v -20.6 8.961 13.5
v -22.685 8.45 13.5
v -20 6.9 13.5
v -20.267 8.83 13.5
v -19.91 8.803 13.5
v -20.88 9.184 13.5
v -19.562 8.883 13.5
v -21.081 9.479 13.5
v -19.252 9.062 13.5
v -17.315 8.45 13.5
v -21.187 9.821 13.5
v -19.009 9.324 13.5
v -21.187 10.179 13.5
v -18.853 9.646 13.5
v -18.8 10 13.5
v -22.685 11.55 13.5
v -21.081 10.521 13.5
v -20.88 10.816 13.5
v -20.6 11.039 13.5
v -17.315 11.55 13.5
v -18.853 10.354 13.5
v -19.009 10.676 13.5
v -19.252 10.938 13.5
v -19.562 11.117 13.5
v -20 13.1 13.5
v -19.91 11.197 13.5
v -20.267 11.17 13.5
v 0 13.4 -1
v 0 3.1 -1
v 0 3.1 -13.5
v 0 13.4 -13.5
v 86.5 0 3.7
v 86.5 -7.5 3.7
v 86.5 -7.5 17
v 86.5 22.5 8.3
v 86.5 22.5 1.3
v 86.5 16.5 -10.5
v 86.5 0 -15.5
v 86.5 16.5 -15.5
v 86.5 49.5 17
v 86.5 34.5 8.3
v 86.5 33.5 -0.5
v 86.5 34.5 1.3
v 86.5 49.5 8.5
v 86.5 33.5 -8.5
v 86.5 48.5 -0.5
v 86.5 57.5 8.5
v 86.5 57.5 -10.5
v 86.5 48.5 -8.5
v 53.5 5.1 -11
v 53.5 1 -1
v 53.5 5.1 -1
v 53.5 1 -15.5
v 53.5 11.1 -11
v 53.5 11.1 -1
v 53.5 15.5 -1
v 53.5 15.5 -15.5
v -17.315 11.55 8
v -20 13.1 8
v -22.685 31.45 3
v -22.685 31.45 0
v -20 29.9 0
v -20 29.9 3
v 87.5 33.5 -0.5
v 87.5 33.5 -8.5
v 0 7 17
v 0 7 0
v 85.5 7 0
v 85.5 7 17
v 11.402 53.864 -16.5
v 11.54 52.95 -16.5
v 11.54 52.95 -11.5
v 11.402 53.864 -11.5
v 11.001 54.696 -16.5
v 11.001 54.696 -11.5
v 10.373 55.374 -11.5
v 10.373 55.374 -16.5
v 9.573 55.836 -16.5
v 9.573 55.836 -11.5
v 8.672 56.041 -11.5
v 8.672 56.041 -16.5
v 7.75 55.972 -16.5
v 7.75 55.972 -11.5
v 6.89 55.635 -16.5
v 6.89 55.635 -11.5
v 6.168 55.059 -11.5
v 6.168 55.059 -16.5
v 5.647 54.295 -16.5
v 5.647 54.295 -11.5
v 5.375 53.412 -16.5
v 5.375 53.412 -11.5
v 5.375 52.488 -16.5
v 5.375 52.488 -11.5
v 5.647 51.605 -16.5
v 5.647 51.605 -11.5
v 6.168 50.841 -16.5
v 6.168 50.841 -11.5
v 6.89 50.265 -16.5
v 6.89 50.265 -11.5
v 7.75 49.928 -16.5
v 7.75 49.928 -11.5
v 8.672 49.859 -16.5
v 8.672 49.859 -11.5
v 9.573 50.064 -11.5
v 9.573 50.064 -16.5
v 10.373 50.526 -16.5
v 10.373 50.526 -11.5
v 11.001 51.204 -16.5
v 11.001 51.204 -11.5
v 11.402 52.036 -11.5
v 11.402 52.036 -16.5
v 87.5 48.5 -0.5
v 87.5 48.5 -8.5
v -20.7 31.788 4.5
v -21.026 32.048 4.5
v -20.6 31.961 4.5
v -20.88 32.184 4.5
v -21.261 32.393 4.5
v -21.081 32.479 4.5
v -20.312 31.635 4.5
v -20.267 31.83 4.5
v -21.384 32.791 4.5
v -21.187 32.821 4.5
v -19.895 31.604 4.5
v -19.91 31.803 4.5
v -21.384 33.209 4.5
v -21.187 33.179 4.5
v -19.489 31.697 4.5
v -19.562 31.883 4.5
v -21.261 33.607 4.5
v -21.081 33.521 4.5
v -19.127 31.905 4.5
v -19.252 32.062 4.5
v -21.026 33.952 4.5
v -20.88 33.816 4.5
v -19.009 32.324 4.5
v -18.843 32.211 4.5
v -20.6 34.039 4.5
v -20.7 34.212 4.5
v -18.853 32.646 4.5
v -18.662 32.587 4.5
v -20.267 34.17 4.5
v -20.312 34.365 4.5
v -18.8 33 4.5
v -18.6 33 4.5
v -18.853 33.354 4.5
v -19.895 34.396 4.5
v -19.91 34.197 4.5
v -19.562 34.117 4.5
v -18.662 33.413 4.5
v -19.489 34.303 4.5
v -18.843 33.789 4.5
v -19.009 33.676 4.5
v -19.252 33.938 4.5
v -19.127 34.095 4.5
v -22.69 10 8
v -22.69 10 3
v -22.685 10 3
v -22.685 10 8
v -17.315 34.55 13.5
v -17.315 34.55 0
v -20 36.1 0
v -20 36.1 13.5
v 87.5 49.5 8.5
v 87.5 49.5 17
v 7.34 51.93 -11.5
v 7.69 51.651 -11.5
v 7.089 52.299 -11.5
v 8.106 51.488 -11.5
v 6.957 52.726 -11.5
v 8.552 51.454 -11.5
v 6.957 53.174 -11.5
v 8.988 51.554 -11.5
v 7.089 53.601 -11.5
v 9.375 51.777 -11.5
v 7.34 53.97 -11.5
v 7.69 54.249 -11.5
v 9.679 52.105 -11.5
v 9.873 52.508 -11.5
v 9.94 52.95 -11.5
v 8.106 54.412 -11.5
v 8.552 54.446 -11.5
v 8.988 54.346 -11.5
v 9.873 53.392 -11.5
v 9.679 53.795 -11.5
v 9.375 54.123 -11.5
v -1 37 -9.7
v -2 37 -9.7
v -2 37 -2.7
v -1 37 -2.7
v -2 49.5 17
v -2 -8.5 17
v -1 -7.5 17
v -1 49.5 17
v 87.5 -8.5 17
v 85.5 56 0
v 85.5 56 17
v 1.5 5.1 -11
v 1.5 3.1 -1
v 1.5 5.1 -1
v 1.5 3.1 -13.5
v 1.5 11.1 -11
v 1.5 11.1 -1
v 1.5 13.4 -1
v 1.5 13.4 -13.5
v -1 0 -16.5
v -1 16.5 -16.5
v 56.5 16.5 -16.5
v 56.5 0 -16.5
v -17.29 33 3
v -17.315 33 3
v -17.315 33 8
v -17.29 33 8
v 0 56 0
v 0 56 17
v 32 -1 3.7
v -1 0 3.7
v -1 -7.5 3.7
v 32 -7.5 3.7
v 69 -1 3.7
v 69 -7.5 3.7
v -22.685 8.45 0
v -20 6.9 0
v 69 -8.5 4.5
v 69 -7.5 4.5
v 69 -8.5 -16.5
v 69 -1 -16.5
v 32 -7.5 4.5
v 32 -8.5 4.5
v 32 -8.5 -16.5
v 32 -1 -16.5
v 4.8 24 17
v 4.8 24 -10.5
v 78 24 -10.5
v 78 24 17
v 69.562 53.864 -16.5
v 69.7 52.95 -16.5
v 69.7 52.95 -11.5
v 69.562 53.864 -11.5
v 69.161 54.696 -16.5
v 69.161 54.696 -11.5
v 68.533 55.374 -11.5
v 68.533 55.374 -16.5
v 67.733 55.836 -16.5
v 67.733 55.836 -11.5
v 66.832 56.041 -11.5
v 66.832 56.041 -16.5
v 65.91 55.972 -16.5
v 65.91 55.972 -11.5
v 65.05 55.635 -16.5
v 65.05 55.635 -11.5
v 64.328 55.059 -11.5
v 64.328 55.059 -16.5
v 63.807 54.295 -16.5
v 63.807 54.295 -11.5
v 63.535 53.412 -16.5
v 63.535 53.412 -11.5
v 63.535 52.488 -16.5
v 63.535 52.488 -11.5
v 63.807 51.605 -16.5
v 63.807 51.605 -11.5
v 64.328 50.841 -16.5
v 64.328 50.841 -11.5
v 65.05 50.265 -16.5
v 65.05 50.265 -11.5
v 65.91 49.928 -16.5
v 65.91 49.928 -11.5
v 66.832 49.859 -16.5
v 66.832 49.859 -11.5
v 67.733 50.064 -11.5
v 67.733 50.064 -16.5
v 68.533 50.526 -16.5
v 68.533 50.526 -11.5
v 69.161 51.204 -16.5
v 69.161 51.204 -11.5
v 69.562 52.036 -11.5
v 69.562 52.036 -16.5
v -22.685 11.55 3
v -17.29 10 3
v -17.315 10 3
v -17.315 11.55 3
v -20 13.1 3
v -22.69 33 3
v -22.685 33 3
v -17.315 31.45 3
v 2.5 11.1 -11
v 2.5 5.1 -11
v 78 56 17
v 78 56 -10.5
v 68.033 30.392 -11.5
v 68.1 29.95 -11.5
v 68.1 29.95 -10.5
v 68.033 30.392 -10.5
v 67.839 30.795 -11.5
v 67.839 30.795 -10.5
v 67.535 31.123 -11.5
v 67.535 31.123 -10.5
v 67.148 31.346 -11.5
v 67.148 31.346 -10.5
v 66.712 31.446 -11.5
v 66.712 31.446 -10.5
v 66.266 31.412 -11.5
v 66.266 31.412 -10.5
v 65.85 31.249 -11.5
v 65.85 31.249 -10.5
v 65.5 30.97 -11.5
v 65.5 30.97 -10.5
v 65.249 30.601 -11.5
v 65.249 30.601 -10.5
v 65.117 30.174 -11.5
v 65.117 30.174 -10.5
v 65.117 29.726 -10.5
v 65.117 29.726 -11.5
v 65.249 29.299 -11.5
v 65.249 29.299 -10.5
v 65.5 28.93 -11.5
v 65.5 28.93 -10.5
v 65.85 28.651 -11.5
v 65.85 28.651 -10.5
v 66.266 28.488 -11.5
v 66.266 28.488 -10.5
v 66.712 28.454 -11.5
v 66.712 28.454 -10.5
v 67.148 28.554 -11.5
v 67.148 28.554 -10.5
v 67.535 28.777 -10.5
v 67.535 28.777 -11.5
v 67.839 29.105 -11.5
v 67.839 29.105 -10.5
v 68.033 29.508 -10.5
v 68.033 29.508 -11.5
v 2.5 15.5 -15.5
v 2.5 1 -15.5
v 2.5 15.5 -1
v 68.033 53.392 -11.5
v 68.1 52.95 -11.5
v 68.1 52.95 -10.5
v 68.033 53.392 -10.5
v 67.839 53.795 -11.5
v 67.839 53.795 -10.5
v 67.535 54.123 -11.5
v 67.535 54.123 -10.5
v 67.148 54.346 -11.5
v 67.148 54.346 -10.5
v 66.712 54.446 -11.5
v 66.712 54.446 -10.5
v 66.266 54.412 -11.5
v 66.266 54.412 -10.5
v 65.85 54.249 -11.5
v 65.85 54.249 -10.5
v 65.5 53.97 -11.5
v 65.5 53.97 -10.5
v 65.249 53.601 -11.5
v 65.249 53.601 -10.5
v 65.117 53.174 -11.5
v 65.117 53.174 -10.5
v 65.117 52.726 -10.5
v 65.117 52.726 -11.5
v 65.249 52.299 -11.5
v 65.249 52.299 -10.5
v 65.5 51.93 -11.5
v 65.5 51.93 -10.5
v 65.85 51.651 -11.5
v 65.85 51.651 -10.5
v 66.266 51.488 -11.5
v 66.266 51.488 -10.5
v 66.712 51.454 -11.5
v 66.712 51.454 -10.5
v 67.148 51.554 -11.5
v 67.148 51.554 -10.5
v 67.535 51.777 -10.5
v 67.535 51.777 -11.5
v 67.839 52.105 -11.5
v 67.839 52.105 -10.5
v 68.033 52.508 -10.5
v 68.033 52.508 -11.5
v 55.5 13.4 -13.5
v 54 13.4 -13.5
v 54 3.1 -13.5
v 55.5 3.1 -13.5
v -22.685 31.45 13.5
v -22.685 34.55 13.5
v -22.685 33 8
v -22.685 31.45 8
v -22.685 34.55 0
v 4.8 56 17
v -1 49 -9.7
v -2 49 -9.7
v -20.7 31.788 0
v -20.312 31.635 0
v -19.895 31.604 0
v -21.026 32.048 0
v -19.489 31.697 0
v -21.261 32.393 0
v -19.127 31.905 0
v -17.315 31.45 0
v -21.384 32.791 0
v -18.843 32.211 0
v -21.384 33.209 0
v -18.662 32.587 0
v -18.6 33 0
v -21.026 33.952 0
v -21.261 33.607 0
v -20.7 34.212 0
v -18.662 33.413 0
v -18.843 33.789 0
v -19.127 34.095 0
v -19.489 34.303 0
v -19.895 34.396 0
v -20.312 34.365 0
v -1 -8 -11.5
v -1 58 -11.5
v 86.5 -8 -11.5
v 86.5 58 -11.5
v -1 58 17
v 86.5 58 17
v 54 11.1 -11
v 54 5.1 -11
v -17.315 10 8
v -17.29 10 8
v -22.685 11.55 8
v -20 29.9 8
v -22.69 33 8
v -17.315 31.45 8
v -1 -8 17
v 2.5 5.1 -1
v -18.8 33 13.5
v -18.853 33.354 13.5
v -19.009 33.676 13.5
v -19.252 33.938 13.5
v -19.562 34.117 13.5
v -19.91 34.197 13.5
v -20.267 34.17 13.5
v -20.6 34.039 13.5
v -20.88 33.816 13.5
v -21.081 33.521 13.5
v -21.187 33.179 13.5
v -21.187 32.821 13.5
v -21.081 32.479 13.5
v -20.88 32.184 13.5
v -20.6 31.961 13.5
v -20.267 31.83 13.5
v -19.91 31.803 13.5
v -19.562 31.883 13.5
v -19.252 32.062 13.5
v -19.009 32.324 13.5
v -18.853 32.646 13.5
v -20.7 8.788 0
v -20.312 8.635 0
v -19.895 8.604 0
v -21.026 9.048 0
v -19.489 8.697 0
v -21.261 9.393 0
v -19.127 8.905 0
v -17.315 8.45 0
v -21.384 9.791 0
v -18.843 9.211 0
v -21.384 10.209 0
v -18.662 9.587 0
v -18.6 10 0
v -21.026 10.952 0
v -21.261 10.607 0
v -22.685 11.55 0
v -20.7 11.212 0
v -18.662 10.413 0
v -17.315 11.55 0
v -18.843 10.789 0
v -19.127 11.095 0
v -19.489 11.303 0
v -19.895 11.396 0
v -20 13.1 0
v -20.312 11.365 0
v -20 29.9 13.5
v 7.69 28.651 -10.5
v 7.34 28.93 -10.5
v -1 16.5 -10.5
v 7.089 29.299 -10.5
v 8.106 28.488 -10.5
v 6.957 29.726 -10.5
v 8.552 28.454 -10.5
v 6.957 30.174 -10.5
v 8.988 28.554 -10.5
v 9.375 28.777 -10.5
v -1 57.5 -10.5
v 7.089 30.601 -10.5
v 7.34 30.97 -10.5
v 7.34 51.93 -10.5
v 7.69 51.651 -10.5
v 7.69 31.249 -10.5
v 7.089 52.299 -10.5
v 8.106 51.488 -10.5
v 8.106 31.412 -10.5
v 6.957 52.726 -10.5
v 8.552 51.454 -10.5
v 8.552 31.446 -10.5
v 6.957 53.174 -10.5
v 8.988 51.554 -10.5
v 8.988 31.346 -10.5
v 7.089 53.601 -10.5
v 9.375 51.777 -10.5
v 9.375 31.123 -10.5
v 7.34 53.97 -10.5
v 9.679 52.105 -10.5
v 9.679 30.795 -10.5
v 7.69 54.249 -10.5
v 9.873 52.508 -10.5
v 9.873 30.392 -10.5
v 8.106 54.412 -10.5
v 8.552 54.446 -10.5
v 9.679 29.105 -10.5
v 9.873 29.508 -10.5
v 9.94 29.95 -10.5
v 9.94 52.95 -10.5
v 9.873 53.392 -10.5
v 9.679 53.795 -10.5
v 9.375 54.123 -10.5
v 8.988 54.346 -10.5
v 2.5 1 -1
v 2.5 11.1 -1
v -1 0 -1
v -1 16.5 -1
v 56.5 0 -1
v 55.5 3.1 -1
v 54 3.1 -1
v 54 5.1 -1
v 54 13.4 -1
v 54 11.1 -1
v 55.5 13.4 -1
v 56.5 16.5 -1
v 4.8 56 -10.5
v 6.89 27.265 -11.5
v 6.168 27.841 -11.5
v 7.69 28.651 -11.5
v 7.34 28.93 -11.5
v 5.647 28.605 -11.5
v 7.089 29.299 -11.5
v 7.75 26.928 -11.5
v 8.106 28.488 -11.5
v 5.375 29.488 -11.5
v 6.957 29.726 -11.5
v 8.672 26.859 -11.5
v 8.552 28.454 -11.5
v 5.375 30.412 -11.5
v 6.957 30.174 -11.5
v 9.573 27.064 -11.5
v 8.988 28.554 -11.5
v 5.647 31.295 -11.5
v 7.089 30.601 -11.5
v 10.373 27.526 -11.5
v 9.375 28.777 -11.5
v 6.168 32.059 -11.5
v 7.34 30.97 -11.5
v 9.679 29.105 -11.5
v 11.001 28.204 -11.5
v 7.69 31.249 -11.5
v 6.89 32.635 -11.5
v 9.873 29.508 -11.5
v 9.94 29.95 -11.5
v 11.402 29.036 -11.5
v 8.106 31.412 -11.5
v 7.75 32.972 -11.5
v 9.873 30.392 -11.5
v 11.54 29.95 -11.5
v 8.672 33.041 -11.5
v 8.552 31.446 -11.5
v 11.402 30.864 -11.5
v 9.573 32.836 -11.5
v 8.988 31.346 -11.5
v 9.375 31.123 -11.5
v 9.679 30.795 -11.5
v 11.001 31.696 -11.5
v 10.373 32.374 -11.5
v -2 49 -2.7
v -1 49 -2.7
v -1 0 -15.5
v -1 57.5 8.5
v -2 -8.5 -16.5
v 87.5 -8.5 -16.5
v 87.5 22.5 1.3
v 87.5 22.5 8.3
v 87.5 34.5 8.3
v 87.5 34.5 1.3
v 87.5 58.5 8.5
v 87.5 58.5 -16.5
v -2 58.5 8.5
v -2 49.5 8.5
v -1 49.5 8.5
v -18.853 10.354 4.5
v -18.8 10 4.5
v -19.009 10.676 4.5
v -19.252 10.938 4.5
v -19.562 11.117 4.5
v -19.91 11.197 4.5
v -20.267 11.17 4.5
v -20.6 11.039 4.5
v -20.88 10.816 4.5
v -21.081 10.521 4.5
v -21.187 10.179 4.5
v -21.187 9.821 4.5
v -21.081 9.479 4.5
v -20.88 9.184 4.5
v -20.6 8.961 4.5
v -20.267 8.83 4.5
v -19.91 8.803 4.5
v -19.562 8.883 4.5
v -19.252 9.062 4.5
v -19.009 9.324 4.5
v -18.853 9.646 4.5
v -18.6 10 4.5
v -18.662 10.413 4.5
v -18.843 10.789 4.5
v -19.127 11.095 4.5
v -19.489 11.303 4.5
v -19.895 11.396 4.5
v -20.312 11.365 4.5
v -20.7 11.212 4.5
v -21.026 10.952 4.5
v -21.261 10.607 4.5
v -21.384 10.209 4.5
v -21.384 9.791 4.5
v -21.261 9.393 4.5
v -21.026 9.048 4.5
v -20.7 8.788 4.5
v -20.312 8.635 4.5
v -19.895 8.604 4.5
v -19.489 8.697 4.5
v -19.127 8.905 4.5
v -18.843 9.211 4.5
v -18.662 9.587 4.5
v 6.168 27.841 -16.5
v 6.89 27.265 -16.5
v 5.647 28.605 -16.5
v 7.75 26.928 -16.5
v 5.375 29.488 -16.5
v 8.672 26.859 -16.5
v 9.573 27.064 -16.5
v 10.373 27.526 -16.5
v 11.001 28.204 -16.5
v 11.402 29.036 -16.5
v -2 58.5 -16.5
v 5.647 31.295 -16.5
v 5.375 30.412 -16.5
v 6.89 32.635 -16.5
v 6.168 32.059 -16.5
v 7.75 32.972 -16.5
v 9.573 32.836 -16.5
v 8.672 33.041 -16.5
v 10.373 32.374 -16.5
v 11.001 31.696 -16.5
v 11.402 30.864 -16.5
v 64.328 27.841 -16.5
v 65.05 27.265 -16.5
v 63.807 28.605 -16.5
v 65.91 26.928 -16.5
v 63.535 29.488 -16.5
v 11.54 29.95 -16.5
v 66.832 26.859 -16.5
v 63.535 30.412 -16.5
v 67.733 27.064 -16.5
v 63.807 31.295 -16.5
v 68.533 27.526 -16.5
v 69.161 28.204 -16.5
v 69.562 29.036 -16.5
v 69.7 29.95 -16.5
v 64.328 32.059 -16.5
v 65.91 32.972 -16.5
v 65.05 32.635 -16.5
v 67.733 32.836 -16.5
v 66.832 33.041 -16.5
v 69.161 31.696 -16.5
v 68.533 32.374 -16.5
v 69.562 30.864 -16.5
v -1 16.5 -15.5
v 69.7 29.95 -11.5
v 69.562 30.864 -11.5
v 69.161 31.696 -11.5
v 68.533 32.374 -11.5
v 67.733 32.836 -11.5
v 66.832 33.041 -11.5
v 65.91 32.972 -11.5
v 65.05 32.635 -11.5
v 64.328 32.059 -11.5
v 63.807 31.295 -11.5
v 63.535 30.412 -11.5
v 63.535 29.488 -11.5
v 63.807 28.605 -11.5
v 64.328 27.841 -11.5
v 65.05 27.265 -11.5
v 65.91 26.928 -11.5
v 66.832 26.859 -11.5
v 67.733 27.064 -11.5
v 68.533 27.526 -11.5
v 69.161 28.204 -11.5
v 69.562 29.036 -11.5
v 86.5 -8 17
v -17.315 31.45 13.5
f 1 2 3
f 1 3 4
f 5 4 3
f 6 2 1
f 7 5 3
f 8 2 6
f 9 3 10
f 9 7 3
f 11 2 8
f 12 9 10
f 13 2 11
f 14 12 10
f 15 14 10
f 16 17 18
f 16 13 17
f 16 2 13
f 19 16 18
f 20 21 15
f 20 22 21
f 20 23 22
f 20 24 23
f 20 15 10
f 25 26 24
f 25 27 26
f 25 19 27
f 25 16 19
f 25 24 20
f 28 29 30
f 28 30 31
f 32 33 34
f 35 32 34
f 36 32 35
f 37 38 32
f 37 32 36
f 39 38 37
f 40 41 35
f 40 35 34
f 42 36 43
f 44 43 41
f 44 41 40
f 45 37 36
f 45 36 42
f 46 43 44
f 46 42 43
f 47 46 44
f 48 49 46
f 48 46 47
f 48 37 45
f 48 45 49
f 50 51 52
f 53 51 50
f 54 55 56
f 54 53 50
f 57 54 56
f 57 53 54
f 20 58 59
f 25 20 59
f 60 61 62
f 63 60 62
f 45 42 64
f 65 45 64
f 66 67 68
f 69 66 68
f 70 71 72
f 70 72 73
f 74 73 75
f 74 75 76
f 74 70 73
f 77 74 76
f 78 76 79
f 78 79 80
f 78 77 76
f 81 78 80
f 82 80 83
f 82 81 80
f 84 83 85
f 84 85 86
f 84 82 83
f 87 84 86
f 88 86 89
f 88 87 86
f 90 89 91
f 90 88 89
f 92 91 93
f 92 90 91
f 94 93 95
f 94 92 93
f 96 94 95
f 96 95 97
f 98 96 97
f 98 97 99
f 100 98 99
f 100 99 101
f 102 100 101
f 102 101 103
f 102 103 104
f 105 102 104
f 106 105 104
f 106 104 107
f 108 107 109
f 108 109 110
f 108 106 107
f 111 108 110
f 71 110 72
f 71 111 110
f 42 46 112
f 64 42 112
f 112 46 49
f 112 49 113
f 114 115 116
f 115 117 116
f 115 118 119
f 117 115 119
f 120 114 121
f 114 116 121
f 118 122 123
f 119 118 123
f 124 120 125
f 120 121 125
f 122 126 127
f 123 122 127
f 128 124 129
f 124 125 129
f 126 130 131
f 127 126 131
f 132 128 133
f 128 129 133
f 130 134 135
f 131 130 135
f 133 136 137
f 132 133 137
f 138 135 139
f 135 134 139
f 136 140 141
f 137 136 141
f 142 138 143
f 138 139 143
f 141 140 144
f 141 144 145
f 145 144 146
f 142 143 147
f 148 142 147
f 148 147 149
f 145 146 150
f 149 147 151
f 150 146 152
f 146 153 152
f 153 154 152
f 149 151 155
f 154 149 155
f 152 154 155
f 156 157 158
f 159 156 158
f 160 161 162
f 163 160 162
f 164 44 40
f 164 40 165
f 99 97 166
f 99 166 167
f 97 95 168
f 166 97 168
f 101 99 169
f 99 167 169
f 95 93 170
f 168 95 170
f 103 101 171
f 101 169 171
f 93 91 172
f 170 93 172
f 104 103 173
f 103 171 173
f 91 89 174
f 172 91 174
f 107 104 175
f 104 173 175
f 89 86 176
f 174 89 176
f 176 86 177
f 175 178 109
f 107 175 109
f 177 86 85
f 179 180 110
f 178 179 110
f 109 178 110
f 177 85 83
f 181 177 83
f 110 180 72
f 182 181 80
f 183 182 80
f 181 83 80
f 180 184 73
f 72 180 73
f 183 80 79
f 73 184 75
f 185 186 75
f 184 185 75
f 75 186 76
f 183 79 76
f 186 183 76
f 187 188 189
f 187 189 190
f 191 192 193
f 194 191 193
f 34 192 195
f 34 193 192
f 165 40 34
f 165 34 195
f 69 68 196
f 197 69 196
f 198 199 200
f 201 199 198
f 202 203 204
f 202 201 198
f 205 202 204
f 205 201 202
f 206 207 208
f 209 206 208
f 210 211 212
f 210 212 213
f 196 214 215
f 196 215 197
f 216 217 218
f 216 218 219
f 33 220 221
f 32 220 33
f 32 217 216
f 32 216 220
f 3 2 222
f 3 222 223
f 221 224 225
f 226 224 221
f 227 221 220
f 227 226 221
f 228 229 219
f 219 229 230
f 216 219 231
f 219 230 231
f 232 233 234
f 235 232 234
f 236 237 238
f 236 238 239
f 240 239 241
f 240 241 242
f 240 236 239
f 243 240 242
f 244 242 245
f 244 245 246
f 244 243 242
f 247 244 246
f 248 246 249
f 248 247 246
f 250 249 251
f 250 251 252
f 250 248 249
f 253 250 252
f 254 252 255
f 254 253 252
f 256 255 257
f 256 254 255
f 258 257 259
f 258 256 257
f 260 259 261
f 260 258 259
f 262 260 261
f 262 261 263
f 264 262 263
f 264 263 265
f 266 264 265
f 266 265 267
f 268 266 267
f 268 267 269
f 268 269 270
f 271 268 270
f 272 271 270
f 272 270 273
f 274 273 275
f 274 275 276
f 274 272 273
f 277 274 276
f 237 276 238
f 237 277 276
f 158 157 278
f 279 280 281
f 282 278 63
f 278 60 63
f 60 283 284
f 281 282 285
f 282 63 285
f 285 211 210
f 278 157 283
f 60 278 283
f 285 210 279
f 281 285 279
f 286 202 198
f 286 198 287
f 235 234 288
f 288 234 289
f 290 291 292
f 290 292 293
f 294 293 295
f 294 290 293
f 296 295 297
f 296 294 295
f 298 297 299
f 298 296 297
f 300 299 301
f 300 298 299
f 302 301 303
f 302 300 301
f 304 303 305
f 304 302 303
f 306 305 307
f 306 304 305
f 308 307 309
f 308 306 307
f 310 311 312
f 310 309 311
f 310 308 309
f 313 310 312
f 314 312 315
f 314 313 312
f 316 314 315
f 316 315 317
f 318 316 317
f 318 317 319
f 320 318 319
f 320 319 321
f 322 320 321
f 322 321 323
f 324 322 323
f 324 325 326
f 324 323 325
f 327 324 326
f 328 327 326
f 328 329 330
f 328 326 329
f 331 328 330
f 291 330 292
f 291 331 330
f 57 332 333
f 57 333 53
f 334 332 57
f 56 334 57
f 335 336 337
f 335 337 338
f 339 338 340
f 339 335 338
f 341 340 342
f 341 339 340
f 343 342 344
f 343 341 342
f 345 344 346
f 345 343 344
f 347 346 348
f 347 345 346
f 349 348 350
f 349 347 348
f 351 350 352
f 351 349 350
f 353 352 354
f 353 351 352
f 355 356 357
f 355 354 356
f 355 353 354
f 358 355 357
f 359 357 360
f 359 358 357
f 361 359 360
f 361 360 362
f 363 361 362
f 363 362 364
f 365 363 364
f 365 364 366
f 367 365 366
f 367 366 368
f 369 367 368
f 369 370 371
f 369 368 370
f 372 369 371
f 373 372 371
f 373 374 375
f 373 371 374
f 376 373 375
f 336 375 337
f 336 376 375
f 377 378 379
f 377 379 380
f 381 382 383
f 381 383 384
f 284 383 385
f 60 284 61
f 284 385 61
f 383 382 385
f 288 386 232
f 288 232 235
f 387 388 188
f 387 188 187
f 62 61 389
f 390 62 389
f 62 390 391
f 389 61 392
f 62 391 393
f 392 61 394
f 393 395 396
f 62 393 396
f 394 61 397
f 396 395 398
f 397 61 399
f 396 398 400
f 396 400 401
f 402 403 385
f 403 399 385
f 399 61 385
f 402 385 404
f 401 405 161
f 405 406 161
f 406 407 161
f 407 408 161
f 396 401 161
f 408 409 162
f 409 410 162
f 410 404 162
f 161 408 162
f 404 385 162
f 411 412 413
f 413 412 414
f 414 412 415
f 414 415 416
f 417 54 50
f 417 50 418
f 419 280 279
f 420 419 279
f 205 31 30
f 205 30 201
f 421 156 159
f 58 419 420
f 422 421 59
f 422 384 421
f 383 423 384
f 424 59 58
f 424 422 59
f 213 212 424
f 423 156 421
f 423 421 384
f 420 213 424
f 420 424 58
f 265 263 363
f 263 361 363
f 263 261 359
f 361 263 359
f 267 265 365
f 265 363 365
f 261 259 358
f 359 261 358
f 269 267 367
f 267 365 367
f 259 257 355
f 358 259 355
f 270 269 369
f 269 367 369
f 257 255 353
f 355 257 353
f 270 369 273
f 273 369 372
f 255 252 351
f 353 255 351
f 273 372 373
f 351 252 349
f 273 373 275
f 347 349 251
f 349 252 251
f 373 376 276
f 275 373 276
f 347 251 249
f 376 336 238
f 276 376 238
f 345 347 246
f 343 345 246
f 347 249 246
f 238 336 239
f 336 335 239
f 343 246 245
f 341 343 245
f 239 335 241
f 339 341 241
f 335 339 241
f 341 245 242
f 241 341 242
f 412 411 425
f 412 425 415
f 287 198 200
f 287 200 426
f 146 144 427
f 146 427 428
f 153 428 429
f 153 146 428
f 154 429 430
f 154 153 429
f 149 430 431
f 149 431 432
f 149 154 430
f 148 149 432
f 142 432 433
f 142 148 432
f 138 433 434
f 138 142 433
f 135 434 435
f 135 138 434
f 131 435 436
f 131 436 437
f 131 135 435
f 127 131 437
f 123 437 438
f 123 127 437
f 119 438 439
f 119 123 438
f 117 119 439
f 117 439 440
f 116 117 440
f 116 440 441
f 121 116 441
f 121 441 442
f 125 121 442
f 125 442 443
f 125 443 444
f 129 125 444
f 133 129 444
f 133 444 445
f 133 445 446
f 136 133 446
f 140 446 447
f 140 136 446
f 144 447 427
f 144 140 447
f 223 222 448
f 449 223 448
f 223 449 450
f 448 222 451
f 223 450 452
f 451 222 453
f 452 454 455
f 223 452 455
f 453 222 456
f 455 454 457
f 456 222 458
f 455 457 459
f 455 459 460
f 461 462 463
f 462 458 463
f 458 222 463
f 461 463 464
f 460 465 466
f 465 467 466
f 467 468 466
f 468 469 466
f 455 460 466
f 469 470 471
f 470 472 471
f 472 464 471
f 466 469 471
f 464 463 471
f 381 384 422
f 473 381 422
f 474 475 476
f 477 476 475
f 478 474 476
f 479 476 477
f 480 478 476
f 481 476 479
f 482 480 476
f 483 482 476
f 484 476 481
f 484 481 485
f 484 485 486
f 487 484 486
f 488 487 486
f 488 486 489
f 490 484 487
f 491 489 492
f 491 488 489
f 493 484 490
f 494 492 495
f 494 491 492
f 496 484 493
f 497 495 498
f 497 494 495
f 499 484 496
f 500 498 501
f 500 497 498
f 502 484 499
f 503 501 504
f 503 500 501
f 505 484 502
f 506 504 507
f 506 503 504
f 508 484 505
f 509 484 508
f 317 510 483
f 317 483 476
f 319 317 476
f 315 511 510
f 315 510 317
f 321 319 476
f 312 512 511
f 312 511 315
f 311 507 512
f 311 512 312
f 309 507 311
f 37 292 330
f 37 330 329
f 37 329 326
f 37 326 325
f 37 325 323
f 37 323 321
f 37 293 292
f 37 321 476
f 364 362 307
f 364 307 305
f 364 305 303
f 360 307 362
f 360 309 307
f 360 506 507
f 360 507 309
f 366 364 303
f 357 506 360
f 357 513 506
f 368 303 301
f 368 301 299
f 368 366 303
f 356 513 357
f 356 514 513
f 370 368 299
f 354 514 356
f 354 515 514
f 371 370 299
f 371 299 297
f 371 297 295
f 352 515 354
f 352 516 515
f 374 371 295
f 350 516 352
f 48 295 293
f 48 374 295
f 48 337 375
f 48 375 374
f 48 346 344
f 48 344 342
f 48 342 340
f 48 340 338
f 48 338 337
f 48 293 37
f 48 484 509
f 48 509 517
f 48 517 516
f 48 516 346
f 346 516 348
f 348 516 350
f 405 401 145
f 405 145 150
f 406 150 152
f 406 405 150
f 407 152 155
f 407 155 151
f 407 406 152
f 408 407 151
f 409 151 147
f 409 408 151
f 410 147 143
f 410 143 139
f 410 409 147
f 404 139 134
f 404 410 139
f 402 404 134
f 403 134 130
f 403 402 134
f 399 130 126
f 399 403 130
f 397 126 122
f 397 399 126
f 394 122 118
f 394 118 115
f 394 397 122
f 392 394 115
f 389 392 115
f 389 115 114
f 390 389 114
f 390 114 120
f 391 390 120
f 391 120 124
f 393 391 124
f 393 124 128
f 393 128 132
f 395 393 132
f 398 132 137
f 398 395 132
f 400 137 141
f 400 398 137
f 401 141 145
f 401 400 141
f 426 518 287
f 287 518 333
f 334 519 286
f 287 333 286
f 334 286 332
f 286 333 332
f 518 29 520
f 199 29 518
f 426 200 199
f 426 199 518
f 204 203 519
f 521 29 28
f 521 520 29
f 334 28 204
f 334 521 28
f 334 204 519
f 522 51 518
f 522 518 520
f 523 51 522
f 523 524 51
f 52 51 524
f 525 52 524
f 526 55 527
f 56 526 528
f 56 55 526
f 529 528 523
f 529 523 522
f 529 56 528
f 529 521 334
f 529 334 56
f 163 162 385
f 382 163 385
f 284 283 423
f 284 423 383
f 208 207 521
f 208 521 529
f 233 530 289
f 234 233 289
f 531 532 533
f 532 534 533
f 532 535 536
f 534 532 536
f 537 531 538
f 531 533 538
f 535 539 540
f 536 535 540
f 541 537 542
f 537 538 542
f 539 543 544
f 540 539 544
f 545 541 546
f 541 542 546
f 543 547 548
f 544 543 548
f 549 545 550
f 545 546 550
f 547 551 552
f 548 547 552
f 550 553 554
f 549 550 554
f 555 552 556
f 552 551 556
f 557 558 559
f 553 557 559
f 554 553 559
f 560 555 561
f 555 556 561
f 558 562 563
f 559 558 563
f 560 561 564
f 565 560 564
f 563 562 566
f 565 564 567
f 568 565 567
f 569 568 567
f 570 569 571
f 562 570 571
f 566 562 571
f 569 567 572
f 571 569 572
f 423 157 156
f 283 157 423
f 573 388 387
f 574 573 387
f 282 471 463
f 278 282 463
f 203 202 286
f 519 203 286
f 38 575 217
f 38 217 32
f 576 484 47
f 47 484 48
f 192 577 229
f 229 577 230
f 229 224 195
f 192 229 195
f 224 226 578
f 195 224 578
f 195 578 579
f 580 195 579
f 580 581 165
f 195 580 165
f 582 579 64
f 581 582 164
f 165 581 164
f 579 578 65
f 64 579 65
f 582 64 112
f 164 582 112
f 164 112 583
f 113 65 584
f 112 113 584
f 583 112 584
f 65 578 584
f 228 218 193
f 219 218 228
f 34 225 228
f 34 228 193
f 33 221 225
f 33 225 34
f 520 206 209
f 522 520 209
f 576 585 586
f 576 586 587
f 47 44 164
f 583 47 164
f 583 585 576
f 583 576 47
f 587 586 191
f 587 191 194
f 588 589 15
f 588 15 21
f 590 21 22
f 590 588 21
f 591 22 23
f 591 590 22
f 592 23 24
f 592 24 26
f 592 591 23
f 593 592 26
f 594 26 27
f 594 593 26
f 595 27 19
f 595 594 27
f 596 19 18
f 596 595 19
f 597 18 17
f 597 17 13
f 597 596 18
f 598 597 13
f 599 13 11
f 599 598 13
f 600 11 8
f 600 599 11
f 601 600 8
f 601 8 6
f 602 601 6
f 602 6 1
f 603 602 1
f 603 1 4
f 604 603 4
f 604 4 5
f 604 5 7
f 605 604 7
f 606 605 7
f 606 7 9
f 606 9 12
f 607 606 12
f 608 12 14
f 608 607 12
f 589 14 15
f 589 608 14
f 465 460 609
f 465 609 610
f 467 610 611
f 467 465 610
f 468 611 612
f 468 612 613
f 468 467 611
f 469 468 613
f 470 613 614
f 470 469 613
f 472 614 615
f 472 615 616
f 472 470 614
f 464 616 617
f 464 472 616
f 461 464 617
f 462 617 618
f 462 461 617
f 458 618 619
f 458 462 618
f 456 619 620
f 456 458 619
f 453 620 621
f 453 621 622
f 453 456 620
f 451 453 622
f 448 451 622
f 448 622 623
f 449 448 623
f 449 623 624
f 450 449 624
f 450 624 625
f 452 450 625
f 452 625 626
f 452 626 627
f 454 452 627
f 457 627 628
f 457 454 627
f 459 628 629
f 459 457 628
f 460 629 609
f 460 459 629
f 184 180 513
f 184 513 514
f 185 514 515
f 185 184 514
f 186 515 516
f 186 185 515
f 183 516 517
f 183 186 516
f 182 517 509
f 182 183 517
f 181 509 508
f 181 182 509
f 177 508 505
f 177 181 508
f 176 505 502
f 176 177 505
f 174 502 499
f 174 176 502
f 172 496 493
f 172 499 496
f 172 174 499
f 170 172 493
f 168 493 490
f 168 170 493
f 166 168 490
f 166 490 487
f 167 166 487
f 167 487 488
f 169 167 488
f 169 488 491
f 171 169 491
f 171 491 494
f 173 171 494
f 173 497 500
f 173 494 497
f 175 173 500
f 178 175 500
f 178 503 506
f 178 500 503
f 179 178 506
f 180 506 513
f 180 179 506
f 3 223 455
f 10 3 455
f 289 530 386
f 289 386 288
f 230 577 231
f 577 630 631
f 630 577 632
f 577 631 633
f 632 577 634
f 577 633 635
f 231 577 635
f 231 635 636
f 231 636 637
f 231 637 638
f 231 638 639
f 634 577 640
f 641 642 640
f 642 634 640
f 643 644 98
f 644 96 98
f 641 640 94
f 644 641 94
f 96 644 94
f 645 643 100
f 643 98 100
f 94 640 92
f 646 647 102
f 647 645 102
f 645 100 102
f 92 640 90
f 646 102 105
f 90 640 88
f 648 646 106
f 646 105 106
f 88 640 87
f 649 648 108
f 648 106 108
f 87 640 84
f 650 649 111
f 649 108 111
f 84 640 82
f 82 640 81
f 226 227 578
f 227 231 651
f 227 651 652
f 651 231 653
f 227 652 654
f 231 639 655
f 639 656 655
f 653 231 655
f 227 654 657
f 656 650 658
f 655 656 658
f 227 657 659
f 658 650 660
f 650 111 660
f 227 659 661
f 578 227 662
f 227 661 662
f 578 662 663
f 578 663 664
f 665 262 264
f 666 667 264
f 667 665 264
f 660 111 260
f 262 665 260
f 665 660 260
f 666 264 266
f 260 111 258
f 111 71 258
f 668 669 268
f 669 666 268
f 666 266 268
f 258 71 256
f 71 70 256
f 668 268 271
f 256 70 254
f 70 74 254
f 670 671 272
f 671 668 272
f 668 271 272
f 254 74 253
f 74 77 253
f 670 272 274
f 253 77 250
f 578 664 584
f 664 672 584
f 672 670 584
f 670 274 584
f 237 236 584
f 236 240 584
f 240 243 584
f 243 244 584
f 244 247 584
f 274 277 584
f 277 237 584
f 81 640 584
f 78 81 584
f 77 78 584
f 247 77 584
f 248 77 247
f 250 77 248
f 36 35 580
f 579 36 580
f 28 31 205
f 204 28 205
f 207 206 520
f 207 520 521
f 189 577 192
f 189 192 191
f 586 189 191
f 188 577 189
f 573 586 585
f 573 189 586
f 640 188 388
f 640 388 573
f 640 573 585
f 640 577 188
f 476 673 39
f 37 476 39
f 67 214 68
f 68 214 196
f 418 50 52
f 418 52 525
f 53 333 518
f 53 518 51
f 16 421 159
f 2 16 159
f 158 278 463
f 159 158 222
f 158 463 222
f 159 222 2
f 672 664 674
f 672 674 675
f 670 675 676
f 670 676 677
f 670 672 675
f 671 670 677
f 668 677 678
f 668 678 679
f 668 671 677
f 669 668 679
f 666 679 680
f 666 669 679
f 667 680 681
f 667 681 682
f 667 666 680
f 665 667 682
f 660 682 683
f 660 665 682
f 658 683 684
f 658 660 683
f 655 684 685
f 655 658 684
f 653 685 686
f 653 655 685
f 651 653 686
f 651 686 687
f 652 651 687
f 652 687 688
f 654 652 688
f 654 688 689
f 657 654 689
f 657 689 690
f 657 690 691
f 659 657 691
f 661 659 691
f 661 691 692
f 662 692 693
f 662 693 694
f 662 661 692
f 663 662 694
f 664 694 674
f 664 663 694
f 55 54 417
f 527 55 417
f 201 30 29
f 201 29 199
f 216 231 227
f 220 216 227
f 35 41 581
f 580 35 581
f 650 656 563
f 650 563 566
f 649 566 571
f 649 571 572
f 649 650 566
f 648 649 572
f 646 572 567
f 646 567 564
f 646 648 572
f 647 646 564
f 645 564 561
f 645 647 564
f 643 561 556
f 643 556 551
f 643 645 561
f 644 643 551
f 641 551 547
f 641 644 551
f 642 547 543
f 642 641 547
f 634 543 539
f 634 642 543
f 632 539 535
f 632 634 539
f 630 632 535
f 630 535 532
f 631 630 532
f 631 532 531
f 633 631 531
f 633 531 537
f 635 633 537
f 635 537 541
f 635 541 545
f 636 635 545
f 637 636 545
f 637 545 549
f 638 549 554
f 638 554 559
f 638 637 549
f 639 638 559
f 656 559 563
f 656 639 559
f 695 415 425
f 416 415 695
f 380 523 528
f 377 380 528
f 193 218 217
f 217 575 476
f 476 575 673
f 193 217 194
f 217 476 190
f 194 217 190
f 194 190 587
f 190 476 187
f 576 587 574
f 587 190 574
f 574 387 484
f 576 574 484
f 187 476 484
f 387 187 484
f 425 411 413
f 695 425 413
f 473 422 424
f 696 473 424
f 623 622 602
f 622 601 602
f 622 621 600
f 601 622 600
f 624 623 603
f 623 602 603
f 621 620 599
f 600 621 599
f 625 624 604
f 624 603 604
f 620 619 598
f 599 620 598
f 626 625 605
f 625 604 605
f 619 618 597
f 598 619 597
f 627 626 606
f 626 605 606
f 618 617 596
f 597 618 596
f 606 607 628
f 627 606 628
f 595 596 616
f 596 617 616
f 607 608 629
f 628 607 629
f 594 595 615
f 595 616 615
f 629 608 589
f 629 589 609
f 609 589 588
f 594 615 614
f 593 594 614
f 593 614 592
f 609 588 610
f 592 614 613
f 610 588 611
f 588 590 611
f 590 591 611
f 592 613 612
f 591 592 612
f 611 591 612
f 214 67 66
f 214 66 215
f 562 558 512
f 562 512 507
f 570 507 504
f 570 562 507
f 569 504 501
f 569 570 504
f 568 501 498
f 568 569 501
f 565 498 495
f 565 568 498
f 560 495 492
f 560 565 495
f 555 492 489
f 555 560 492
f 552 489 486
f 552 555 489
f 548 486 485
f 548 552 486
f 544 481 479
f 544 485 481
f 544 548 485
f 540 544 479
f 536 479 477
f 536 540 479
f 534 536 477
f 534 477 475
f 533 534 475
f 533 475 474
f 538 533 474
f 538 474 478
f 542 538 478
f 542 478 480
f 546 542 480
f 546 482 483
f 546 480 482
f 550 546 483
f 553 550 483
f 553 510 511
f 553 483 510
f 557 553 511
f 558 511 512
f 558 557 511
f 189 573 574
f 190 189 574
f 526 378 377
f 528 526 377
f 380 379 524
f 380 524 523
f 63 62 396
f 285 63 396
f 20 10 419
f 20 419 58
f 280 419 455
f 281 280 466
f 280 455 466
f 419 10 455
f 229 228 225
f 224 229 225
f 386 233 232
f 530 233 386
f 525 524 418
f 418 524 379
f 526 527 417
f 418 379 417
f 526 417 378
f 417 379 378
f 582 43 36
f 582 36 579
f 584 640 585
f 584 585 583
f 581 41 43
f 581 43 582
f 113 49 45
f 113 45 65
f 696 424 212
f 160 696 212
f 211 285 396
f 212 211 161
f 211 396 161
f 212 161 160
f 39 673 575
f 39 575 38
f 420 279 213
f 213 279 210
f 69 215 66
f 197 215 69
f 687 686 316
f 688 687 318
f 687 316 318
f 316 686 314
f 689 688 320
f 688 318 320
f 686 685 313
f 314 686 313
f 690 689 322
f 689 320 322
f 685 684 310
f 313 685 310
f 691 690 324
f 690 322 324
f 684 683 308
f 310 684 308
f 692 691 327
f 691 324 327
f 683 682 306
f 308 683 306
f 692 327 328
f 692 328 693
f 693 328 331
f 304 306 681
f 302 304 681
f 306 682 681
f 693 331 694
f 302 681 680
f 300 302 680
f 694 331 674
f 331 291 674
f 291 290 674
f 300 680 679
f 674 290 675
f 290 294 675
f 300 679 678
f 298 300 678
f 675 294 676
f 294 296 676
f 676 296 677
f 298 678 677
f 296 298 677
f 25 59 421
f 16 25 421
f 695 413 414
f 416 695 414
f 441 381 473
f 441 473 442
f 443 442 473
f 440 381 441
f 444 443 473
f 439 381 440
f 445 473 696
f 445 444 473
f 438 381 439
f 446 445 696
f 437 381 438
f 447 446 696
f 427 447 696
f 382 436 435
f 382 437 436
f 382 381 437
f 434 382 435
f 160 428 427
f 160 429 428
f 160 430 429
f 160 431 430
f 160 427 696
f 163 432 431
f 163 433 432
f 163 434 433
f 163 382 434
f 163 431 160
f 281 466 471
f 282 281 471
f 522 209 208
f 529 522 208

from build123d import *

# Parameters (mm, degrees)
BOX_W                    = 85.5
BOX_H                    = 49
BOX_DEPTH                = 17
BOX001_W                 = 73.2
BOX001_H                 = 32
BOX001_DEPTH             = 27.5
BOX003_W                 = 87.5
BOX003_H                 = 66
BOX003_DEPTH             = 28.5
BOX027_W                 = 5
BOX027_H                 = 6
BOX027_DEPTH             = 10
BOX026_W                 = 5
BOX026_H                 = 6
BOX026_DEPTH             = 10
BOX025_W                 = 1.5
BOX025_H                 = 10.3
BOX025_DEPTH             = 12.5
BOX024_W                 = 1.5
BOX024_H                 = 10.3
BOX024_DEPTH             = 12.5
BOX022_W                 = 51
BOX022_H                 = 14.5
BOX022_DEPTH             = 14.5
BOX023_W                 = 57.5
BOX023_H                 = 16.5
BOX023_DEPTH             = 15.5
BOX028_W                 = 10
BOX028_H                 = 12
BOX028_DEPTH             = 7
BOX029_W                 = 10
BOX029_H                 = 12
BOX029_DEPTH             = 7
BOX006_W                 = 10
BOX006_H                 = 15
BOX006_DEPTH             = 8
CYLINDER003_R            = 3.1
CYLINDER003_DEPTH        = 5
CYLINDER001_R            = 1.5
CYLINDER001_DEPTH        = 10
CYLINDER_R               = 1.5
CYLINDER_DEPTH           = 10
CYLINDER002_R            = 3.1
CYLINDER002_DEPTH        = 5
BOX002_W                 = 87.5
BOX002_H                 = 7.5
BOX002_DEPTH             = 13.3
BOX005_W                 = 37
BOX005_H                 = 7.5
BOX005_DEPTH             = 21
BOX004_W                 = 87.5
BOX004_H                 = 57.5
BOX004_DEPTH             = 27.5
BOX021_W                 = 87.5
BOX021_H                 = 16.5
BOX021_DEPTH             = 32.5
CYLINDER006_R            = 1.5
CYLINDER006_DEPTH        = 10
CYLINDER007_R            = 3.1
CYLINDER007_DEPTH        = 5
CYLINDER008_R            = 3.1
CYLINDER008_DEPTH        = 5
CYLINDER009_R            = 1.5
CYLINDER009_DEPTH        = 10
BOX031_W                 = 89.5
BOX031_H                 = 9
BOX031_DEPTH             = 8.5
BOX014_W                 = 89.5
BOX014_H                 = 67
BOX014_DEPTH             = 33.5
CYLINDER005_R            = 1.2
CYLINDER005_DEPTH        = 9
CYLINDER010_R            = 1.4
CYLINDER010_DEPTH        = 4.5
CYLINDER011_R            = 1.4
CYLINDER011_DEPTH        = 4.5
CYLINDER004_R            = 1.2
CYLINDER004_DEPTH        = 9
PRISM001_DEPTH           = 13.5
PRISM001_PLACEMENT_ANGLE = 30
PRISM_DEPTH              = 13.5
PRISM_PLACEMENT_ANGLE    = 30
BOX030_W                 = 5.4
BOX030_H                 = 23
BOX030_DEPTH             = 5


with BuildPart() as cube_screen:
    # Box → Box (new body)
    with BuildSketch(Plane(origin=(0, 7, 0), x_dir=(1, 0, 0), z_dir=(0, 0, 1))):
        with Locations((42.75, 24.5)):
            Rectangle(BOX_W, BOX_H)
    extrude(amount=BOX_DEPTH)


with BuildPart() as cube_pizero:
    # Box001 → Box001 (new body)
    with BuildSketch(Plane(origin=(4.8, 24, -10.5), x_dir=(1, 0, 0), z_dir=(0, 0, 1))):
        with Locations((36.6, 16)):
            Rectangle(BOX001_W, BOX001_H)
    extrude(amount=BOX001_DEPTH)


with BuildPart() as cube_outer_thinner:
    # Box003 → Box003 (new body)
    with BuildSketch(Plane(origin=(-1, -8, -11.5), x_dir=(1, 0, 0), z_dir=(0, 0, 1))):
        with Locations((43.75, 33)):
            Rectangle(BOX003_W, BOX003_H)
    extrude(amount=BOX003_DEPTH)


with BuildPart() as cube003_plus_end_gap:
    # Box027 → Box027 (new body)
    with BuildSketch(Plane(origin=(47.5, 5.1, 4.5), x_dir=(1, 0, 0), z_dir=(0, 0, 1))):
        with Locations((2.5, 3)):
            Rectangle(BOX027_W, BOX027_H)
    extrude(amount=BOX027_DEPTH)


with BuildPart() as cube002_minus_spring_gap:
    # Box026 → Box026 (new body)
    with BuildSketch(Plane(origin=(0, 5.1, 4.5), x_dir=(1, 0, 0), z_dir=(0, 0, 1))):
        with Locations((2.5, 3)):
            Rectangle(BOX026_W, BOX026_H)
    extrude(amount=BOX026_DEPTH)


with BuildPart() as cube003_plus_end:
    # Box025 → Box025 (new body)
    with BuildSketch(Plane(origin=(52.5, 3.1, 2), x_dir=(1, 0, 0), z_dir=(0, 0, 1))):
        with Locations((0.75, 5.15)):
            Rectangle(BOX025_W, BOX025_H)
    extrude(amount=BOX025_DEPTH)


with BuildPart() as cube002_minus_spring:
    # Box024 → Box024 (new body)
    with BuildSketch(Plane(origin=(-1.5, 3.1, 2), x_dir=(1, 0, 0), z_dir=(0, 0, 1))):
        with Locations((0.75, 5.15)):
            Rectangle(BOX024_W, BOX024_H)
    extrude(amount=BOX024_DEPTH)


with BuildPart() as cube:
    # Box022 → Box022 (new body)
    with BuildSketch(Plane(origin=(1, 1, 0), x_dir=(1, 0, 0), z_dir=(0, 0, 1))):
        with Locations((25.5, 7.25)):
            Rectangle(BOX022_W, BOX022_H)
    extrude(amount=BOX022_DEPTH)


with BuildPart() as cut004:
    # Box023 → Box023 (new body)
    with BuildSketch(Plane(origin=(-2.5, 0, -1), x_dir=(1, 0, 0), z_dir=(0, 0, 1))):
        with Locations((28.75, 8.25)):
            Rectangle(BOX023_W, BOX023_H)
    extrude(amount=BOX023_DEPTH)

    # Cut: cut Cube
    add(cube.part, mode=Mode.SUBTRACT)

    # Cut001: cut Cube002(minus_spring)
    add(cube002_minus_spring.part, mode=Mode.SUBTRACT)

    # Cut002: cut Cube003(plus_end)
    add(cube003_plus_end.part, mode=Mode.SUBTRACT)

    # Cut003: cut Cube002(minus_spring_gap)
    add(cube002_minus_spring_gap.part, mode=Mode.SUBTRACT)

    # Cut004: cut Cube003(plus_end_gap)
    add(cube003_plus_end_gap.part, mode=Mode.SUBTRACT)


with BuildPart() as cut004_1:
    # Cut004 placement: moved
    add(cut004.part.moved(Location((1.5, 0, -15.5))))


with BuildPart() as cube_micro_usb_port:
    # Box028 → Box028 (new body)
    with BuildSketch(Plane(origin=(77.5, 22.5, 1.3), x_dir=(1, 0, 0), z_dir=(0, 0, 1))):
        with Locations((5, 6)):
            Rectangle(BOX028_W, BOX028_H)
    extrude(amount=BOX028_DEPTH)


with BuildPart() as cube_micro_sdcard:
    # Box029 → Box029 (new body)
    with BuildSketch(Plane(origin=(-2, 37, -9.7), x_dir=(1, 0, 0), z_dir=(0, 0, 1))):
        with Locations((5, 6)):
            Rectangle(BOX029_W, BOX029_H)
    extrude(amount=BOX029_DEPTH)


with BuildPart() as cube_usb_port:
    # Box006 → Box006 (new body)
    with BuildSketch(Plane(origin=(77.5, 33.5, -8.5), x_dir=(1, 0, 0), z_dir=(0, 0, 1))):
        with Locations((5, 7.5)):
            Rectangle(BOX006_W, BOX006_H)
    extrude(amount=BOX006_DEPTH)


with BuildPart() as cylinder001_left_clearance_bottom:
    # Cylinder003 → Cylinder003 (new body)
    with BuildSketch(Plane(origin=(8.44, 52.95, -16.5), x_dir=(1, 0, 0), z_dir=(0, 0, 1))):
        Circle(CYLINDER003_R)
    extrude(amount=CYLINDER003_DEPTH)


with BuildPart() as cylinder001_left_shaft_bottom:
    # Cylinder001 → Cylinder001 (new body)
    with BuildSketch(Plane(origin=(8.44, 52.95, -17), x_dir=(1, 0, 0), z_dir=(0, 0, 1))):
        Circle(CYLINDER001_R)
    extrude(amount=CYLINDER001_DEPTH)


with BuildPart() as cylinder_right_shaft_bottom:
    # Cylinder → Cylinder (new body)
    with BuildSketch(Plane(origin=(66.6, 52.95, -17), x_dir=(1, 0, 0), z_dir=(0, 0, 1))):
        Circle(CYLINDER_R)
    extrude(amount=CYLINDER_DEPTH)


with BuildPart() as cylinder002_right_clearance_bottom:
    # Cylinder002 → Cylinder002 (new body)
    with BuildSketch(Plane(origin=(66.6, 52.95, -16.5), x_dir=(1, 0, 0), z_dir=(0, 0, 1))):
        Circle(CYLINDER002_R)
    extrude(amount=CYLINDER002_DEPTH)


with BuildPart() as cube_screen_to_pcb:
    # Box002 → Box002 (new body)
    with BuildSketch(Plane(origin=(-1, -7.5, 3.7), x_dir=(1, 0, 0), z_dir=(0, 0, 1))):
        with Locations((43.75, 3.75)):
            Rectangle(BOX002_W, BOX002_H)
    extrude(amount=BOX002_DEPTH)


with BuildPart() as cube_screen_to_pcb_cutout:
    # Box005 → Box005 (new body)
    with BuildSketch(Plane(origin=(32, -8.5, -16.5), x_dir=(1, 0, 0), z_dir=(0, 0, 1))):
        with Locations((18.5, 3.75)):
            Rectangle(BOX005_W, BOX005_H)
    extrude(amount=BOX005_DEPTH)


with BuildPart() as cube_screen_cutout:
    # Box004 → Box004 (new body)
    with BuildSketch(Plane(origin=(-1, 0, -10.5), x_dir=(1, 0, 0), z_dir=(0, 0, 1))):
        with Locations((43.75, 28.75)):
            Rectangle(BOX004_W, BOX004_H)
    extrude(amount=BOX004_DEPTH)


with BuildPart() as box021:
    # Box021 → Box021 (new body)
    with BuildSketch(Plane(origin=(-1, 0, -15.5), x_dir=(1, 0, 0), z_dir=(0, 0, 1))):
        with Locations((43.75, 8.25)):
            Rectangle(BOX021_W, BOX021_H)
    extrude(amount=BOX021_DEPTH)


with BuildPart() as cylinder001_left_shaft_top:
    # Cylinder006 → Cylinder006 (new body)
    with BuildSketch(Plane(origin=(8.44, 29.95, -17), x_dir=(1, 0, 0), z_dir=(0, 0, 1))):
        Circle(CYLINDER006_R)
    extrude(amount=CYLINDER006_DEPTH)


with BuildPart() as cylinder001_left_clearance_top:
    # Cylinder007 → Cylinder007 (new body)
    with BuildSketch(Plane(origin=(8.44, 29.95, -16.5), x_dir=(1, 0, 0), z_dir=(0, 0, 1))):
        Circle(CYLINDER007_R)
    extrude(amount=CYLINDER007_DEPTH)


with BuildPart() as cylinder002_right_clearance_top:
    # Cylinder008 → Cylinder008 (new body)
    with BuildSketch(Plane(origin=(66.6, 29.95, -16.5), x_dir=(1, 0, 0), z_dir=(0, 0, 1))):
        Circle(CYLINDER008_R)
    extrude(amount=CYLINDER008_DEPTH)


with BuildPart() as cylinder_right_shaft_top:
    # Cylinder009 → Cylinder009 (new body)
    with BuildSketch(Plane(origin=(66.6, 29.95, -17), x_dir=(1, 0, 0), z_dir=(0, 0, 1))):
        Circle(CYLINDER009_R)
    extrude(amount=CYLINDER009_DEPTH)


with BuildPart() as cube002_gpio_cutout:
    # Box031 → Box031 (new body)
    with BuildSketch(Plane(origin=(-2, 49.5, 8.5), x_dir=(1, 0, 0), z_dir=(0, 0, 1))):
        with Locations((44.75, 4.5)):
            Rectangle(BOX031_W, BOX031_H)
    extrude(amount=BOX031_DEPTH)


with BuildPart() as cut022:
    # Box014 → Box014 (new body)
    with BuildSketch(Plane(origin=(-2, -8.5, -16.5), x_dir=(1, 0, 0), z_dir=(0, 0, 1))):
        with Locations((44.75, 33.5)):
            Rectangle(BOX014_W, BOX014_H)
    extrude(amount=BOX014_DEPTH)

    # Cut007: cut Cube002(GPIO_cutout)
    add(cube002_gpio_cutout.part, mode=Mode.SUBTRACT)

    # Cut008: cut Cylinder(right_shaft_top)
    add(cylinder_right_shaft_top.part, mode=Mode.SUBTRACT)

    # Cut009: cut Cylinder002(right_clearance_top)
    add(cylinder002_right_clearance_top.part, mode=Mode.SUBTRACT)

    # Cut010: cut Cylinder001(left_clearance_top)
    add(cylinder001_left_clearance_top.part, mode=Mode.SUBTRACT)

    # Cut011: cut Cylinder001(left_shaft_top)
    add(cylinder001_left_shaft_top.part, mode=Mode.SUBTRACT)

    # Cut012: cut Box021
    add(box021.part, mode=Mode.SUBTRACT)

    # Cut013: cut Cube(screen_cutout)
    add(cube_screen_cutout.part, mode=Mode.SUBTRACT)

    # Cut014: cut Cube(screen_to_pcb_cutout)
    add(cube_screen_to_pcb_cutout.part, mode=Mode.SUBTRACT)

    # Cut015: cut Cube(screen_to_pcb)
    add(cube_screen_to_pcb.part, mode=Mode.SUBTRACT)

    # Cut016: cut Cylinder002(right_clearance_bottom)
    add(cylinder002_right_clearance_bottom.part, mode=Mode.SUBTRACT)

    # Cut017: cut Cylinder(right_shaft_bottom
    add(cylinder_right_shaft_bottom.part, mode=Mode.SUBTRACT)

    # Cut018: cut Cylinder001(left_shaft_bottom)
    add(cylinder001_left_shaft_bottom.part, mode=Mode.SUBTRACT)

    # Cut019: cut Cylinder001(left_clearance_bottom)
    add(cylinder001_left_clearance_bottom.part, mode=Mode.SUBTRACT)

    # Cut020: cut Cube(usb_port)
    add(cube_usb_port.part, mode=Mode.SUBTRACT)

    # Cut021: cut Cube(micro_sdcard)
    add(cube_micro_sdcard.part, mode=Mode.SUBTRACT)

    # Cut022: cut Cube(micro_usb_port)
    add(cube_micro_usb_port.part, mode=Mode.SUBTRACT)


with BuildPart() as cylinder001_bottom_m2:
    # Cylinder005 → Cylinder005 (new body)
    with BuildSketch(Plane(origin=(-20, 33, 4.5), x_dir=(1, 0, 0), z_dir=(0, 0, 1))):
        Circle(CYLINDER005_R)
    extrude(amount=CYLINDER005_DEPTH)


with BuildPart() as cylinder_top_m3:
    # Cylinder010 → Cylinder010 (new body)
    with BuildSketch(Plane(origin=(-20, 10, 0), x_dir=(1, 0, 0), z_dir=(0, 0, 1))):
        Circle(CYLINDER010_R)
    extrude(amount=CYLINDER010_DEPTH)


with BuildPart() as cylinder001_bottom_m3:
    # Cylinder011 → Cylinder011 (new body)
    with BuildSketch(Plane(origin=(-20, 33, 0), x_dir=(1, 0, 0), z_dir=(0, 0, 1))):
        Circle(CYLINDER011_R)
    extrude(amount=CYLINDER011_DEPTH)


with BuildPart() as cylinder_top_m2:
    # Cylinder004 → Cylinder004 (new body)
    with BuildSketch(Plane(origin=(-20, 10, 4.5), x_dir=(1, 0, 0), z_dir=(0, 0, 1))):
        Circle(CYLINDER004_R)
    extrude(amount=CYLINDER004_DEPTH)


with BuildPart() as prism001_bottom:
    # Prism001 → Prism001 (new body)
    with BuildSketch(Plane.XY):
        Polygon((3.1, 0), (1.55, 2.684679), (-1.55, 2.684679), (-3.1, 0), (-1.55, -2.684679), (1.55, -2.684679), align=None)
    extrude(amount=PRISM001_DEPTH)


with BuildPart() as prism001_bottom_1:
    # Prism001 placement: moved
    add(prism001_bottom.part.moved(Location((-20, 33, 0))).rotate(Axis((-20, 33, 0), (0, 0, 1)), PRISM001_PLACEMENT_ANGLE))


with BuildPart() as prism_top:
    # Prism → Prism (new body)
    with BuildSketch(Plane.XY):
        Polygon((3.1, 0), (1.55, 2.684679), (-1.55, 2.684679), (-3.1, 0), (-1.55, -2.684679), (1.55, -2.684679), align=None)
    extrude(amount=PRISM_DEPTH)


with BuildPart() as prism_top_1:
    # Prism placement: moved
    add(prism_top.part.moved(Location((-20, 10, 0))).rotate(Axis((-20, 10, 0), (0, 0, 1)), PRISM_PLACEMENT_ANGLE))


with BuildPart() as cut026:
    # Box030 → Box030 (new body)
    with BuildSketch(Plane(origin=(-22.69, 10, 3), x_dir=(1, 0, 0), z_dir=(0, 0, 1))):
        with Locations((2.7, 11.5)):
            Rectangle(BOX030_W, BOX030_H)
    extrude(amount=BOX030_DEPTH)

    # Fusion: union Prism001(bottom), Prism(top)
    add(prism001_bottom_1.part)
    add(prism_top_1.part)

    # Cut023: cut Cylinder(top_m2)
    add(cylinder_top_m2.part, mode=Mode.SUBTRACT)

    # Cut024: cut Cylinder001(bottom_m3)
    add(cylinder001_bottom_m3.part, mode=Mode.SUBTRACT)

    # Cut025: cut Cylinder(top_m3)
    add(cylinder_top_m3.part, mode=Mode.SUBTRACT)

    # Cut026: cut Cylinder001(bottom_m2)
    add(cylinder001_bottom_m2.part, mode=Mode.SUBTRACT)


solid = Compound([cube_screen.part, cube_pizero.part, cube_outer_thinner.part, cut004_1.part, cut022.part, cut026.part])
